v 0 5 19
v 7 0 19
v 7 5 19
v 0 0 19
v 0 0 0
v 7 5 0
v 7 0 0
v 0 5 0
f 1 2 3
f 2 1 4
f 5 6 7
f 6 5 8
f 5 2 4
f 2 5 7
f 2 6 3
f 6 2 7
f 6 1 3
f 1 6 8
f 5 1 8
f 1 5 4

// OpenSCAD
// Generated by SolidPython 1.0.1 on 2020-07-29 00:46:55


cube(size = [7, 5, 19]);
/***********************************************
*********      SolidPython code:      **********
************************************************
 
# import packages: SolidPython
from solid import *
from solid.utils import *
from itertools import chain, combinations, permutations


class Resize:

    def __init__(self, scad_file):
        self.scad_file = scad_file
        #self.scad_file = import_scad(scad_file)
        # cone/cylinder param:
        self.r1 = 0
        self.r2 = 0
        self.h = 0
        # rectangular prism param:
        self.w = 0
        self.l = 0
        # ellipse param:
        self.r = 0

    # import OpenScad code (file name corresponds to shape)


    # classify shape + parameters
    def assign(self, param1, param2, param3):
        if self.scad_file == 'cone.scad':
            self.r1 = param1
            self.r2 = param2
            self.h = param3
        elif self.scad_file == 'cylinder.scad':
            self.r1 = param1
            self.r2 = param2
            self.h = param3
        elif self.scad_file == 'rectangularPrism.scad':
            self.h = param1
            self.l = param2
            self.w = param3
        else:
            self.r = param1
            self.h = param2

    # resize parameters
    def iterate(self):
        x = range(3, 20, 2)
        i = 1
        if self.scad_file == 'cone.scad':
            tempList = list(permutations(x, 2))
            for temp in tempList:
                param1 = temp[0]
                param2 = temp[1]
                filepath = 'produced_scad_files/' + 'cone' + str(param1) + '_' + str(param2) + '_' + '.scad'
                scad_render_to_file(cylinder(h=param1, r1=param2, r2=0), filepath)

        elif self.scad_file == 'cylinder.scad':
            tempList = list(permutations(x, 3))
            for temp in tempList:
                param1 = temp[0]
                param2 = temp[1]
                filepath = 'produced_scad_files/' + 'cylinder' + str(param1) + '_' + str(param2) + '_' + '.scad'
                scad_render_to_file(cylinder(h=param1, r1=param2, r2=param2), filepath)

        elif self.scad_file == 'rectangularPrism.scad':
            tempList = list(permutations(x, 3))
            for temp in tempList:
                param1 = temp[0]
                param2 = temp[1]
                param3 = temp[2]
                filepath = 'produced_scad_files/' + 'rectangularPrism' + str(param1) + '_' + str(param2) + '_' + str(
                    param3) + '.scad'
                scad_render_to_file(cube(size=(param1, param2, param3)), filepath)

        elif self.scad_file == 'ellipse.scad':
            tempList = list(permutations(x, 4))
            for temp in tempList:
                param1 = temp[0]
                param2 = temp[1]
                param3 = temp[2]
                param4 = temp[3]
                filepath = 'produced_scad_files/' + 'ellipse' + str(param1) + '_' + str(param2) + '_' + str(param3) + '_' + str(param4) + '.scad'
                scad_render_to_file(scale([param1, param2, param3])(sphere(r=param4)), filepath)

    def render_to_scadfile(self):
        scad_render_to_file(scad, 'example.scad') 
 
************************************************/
